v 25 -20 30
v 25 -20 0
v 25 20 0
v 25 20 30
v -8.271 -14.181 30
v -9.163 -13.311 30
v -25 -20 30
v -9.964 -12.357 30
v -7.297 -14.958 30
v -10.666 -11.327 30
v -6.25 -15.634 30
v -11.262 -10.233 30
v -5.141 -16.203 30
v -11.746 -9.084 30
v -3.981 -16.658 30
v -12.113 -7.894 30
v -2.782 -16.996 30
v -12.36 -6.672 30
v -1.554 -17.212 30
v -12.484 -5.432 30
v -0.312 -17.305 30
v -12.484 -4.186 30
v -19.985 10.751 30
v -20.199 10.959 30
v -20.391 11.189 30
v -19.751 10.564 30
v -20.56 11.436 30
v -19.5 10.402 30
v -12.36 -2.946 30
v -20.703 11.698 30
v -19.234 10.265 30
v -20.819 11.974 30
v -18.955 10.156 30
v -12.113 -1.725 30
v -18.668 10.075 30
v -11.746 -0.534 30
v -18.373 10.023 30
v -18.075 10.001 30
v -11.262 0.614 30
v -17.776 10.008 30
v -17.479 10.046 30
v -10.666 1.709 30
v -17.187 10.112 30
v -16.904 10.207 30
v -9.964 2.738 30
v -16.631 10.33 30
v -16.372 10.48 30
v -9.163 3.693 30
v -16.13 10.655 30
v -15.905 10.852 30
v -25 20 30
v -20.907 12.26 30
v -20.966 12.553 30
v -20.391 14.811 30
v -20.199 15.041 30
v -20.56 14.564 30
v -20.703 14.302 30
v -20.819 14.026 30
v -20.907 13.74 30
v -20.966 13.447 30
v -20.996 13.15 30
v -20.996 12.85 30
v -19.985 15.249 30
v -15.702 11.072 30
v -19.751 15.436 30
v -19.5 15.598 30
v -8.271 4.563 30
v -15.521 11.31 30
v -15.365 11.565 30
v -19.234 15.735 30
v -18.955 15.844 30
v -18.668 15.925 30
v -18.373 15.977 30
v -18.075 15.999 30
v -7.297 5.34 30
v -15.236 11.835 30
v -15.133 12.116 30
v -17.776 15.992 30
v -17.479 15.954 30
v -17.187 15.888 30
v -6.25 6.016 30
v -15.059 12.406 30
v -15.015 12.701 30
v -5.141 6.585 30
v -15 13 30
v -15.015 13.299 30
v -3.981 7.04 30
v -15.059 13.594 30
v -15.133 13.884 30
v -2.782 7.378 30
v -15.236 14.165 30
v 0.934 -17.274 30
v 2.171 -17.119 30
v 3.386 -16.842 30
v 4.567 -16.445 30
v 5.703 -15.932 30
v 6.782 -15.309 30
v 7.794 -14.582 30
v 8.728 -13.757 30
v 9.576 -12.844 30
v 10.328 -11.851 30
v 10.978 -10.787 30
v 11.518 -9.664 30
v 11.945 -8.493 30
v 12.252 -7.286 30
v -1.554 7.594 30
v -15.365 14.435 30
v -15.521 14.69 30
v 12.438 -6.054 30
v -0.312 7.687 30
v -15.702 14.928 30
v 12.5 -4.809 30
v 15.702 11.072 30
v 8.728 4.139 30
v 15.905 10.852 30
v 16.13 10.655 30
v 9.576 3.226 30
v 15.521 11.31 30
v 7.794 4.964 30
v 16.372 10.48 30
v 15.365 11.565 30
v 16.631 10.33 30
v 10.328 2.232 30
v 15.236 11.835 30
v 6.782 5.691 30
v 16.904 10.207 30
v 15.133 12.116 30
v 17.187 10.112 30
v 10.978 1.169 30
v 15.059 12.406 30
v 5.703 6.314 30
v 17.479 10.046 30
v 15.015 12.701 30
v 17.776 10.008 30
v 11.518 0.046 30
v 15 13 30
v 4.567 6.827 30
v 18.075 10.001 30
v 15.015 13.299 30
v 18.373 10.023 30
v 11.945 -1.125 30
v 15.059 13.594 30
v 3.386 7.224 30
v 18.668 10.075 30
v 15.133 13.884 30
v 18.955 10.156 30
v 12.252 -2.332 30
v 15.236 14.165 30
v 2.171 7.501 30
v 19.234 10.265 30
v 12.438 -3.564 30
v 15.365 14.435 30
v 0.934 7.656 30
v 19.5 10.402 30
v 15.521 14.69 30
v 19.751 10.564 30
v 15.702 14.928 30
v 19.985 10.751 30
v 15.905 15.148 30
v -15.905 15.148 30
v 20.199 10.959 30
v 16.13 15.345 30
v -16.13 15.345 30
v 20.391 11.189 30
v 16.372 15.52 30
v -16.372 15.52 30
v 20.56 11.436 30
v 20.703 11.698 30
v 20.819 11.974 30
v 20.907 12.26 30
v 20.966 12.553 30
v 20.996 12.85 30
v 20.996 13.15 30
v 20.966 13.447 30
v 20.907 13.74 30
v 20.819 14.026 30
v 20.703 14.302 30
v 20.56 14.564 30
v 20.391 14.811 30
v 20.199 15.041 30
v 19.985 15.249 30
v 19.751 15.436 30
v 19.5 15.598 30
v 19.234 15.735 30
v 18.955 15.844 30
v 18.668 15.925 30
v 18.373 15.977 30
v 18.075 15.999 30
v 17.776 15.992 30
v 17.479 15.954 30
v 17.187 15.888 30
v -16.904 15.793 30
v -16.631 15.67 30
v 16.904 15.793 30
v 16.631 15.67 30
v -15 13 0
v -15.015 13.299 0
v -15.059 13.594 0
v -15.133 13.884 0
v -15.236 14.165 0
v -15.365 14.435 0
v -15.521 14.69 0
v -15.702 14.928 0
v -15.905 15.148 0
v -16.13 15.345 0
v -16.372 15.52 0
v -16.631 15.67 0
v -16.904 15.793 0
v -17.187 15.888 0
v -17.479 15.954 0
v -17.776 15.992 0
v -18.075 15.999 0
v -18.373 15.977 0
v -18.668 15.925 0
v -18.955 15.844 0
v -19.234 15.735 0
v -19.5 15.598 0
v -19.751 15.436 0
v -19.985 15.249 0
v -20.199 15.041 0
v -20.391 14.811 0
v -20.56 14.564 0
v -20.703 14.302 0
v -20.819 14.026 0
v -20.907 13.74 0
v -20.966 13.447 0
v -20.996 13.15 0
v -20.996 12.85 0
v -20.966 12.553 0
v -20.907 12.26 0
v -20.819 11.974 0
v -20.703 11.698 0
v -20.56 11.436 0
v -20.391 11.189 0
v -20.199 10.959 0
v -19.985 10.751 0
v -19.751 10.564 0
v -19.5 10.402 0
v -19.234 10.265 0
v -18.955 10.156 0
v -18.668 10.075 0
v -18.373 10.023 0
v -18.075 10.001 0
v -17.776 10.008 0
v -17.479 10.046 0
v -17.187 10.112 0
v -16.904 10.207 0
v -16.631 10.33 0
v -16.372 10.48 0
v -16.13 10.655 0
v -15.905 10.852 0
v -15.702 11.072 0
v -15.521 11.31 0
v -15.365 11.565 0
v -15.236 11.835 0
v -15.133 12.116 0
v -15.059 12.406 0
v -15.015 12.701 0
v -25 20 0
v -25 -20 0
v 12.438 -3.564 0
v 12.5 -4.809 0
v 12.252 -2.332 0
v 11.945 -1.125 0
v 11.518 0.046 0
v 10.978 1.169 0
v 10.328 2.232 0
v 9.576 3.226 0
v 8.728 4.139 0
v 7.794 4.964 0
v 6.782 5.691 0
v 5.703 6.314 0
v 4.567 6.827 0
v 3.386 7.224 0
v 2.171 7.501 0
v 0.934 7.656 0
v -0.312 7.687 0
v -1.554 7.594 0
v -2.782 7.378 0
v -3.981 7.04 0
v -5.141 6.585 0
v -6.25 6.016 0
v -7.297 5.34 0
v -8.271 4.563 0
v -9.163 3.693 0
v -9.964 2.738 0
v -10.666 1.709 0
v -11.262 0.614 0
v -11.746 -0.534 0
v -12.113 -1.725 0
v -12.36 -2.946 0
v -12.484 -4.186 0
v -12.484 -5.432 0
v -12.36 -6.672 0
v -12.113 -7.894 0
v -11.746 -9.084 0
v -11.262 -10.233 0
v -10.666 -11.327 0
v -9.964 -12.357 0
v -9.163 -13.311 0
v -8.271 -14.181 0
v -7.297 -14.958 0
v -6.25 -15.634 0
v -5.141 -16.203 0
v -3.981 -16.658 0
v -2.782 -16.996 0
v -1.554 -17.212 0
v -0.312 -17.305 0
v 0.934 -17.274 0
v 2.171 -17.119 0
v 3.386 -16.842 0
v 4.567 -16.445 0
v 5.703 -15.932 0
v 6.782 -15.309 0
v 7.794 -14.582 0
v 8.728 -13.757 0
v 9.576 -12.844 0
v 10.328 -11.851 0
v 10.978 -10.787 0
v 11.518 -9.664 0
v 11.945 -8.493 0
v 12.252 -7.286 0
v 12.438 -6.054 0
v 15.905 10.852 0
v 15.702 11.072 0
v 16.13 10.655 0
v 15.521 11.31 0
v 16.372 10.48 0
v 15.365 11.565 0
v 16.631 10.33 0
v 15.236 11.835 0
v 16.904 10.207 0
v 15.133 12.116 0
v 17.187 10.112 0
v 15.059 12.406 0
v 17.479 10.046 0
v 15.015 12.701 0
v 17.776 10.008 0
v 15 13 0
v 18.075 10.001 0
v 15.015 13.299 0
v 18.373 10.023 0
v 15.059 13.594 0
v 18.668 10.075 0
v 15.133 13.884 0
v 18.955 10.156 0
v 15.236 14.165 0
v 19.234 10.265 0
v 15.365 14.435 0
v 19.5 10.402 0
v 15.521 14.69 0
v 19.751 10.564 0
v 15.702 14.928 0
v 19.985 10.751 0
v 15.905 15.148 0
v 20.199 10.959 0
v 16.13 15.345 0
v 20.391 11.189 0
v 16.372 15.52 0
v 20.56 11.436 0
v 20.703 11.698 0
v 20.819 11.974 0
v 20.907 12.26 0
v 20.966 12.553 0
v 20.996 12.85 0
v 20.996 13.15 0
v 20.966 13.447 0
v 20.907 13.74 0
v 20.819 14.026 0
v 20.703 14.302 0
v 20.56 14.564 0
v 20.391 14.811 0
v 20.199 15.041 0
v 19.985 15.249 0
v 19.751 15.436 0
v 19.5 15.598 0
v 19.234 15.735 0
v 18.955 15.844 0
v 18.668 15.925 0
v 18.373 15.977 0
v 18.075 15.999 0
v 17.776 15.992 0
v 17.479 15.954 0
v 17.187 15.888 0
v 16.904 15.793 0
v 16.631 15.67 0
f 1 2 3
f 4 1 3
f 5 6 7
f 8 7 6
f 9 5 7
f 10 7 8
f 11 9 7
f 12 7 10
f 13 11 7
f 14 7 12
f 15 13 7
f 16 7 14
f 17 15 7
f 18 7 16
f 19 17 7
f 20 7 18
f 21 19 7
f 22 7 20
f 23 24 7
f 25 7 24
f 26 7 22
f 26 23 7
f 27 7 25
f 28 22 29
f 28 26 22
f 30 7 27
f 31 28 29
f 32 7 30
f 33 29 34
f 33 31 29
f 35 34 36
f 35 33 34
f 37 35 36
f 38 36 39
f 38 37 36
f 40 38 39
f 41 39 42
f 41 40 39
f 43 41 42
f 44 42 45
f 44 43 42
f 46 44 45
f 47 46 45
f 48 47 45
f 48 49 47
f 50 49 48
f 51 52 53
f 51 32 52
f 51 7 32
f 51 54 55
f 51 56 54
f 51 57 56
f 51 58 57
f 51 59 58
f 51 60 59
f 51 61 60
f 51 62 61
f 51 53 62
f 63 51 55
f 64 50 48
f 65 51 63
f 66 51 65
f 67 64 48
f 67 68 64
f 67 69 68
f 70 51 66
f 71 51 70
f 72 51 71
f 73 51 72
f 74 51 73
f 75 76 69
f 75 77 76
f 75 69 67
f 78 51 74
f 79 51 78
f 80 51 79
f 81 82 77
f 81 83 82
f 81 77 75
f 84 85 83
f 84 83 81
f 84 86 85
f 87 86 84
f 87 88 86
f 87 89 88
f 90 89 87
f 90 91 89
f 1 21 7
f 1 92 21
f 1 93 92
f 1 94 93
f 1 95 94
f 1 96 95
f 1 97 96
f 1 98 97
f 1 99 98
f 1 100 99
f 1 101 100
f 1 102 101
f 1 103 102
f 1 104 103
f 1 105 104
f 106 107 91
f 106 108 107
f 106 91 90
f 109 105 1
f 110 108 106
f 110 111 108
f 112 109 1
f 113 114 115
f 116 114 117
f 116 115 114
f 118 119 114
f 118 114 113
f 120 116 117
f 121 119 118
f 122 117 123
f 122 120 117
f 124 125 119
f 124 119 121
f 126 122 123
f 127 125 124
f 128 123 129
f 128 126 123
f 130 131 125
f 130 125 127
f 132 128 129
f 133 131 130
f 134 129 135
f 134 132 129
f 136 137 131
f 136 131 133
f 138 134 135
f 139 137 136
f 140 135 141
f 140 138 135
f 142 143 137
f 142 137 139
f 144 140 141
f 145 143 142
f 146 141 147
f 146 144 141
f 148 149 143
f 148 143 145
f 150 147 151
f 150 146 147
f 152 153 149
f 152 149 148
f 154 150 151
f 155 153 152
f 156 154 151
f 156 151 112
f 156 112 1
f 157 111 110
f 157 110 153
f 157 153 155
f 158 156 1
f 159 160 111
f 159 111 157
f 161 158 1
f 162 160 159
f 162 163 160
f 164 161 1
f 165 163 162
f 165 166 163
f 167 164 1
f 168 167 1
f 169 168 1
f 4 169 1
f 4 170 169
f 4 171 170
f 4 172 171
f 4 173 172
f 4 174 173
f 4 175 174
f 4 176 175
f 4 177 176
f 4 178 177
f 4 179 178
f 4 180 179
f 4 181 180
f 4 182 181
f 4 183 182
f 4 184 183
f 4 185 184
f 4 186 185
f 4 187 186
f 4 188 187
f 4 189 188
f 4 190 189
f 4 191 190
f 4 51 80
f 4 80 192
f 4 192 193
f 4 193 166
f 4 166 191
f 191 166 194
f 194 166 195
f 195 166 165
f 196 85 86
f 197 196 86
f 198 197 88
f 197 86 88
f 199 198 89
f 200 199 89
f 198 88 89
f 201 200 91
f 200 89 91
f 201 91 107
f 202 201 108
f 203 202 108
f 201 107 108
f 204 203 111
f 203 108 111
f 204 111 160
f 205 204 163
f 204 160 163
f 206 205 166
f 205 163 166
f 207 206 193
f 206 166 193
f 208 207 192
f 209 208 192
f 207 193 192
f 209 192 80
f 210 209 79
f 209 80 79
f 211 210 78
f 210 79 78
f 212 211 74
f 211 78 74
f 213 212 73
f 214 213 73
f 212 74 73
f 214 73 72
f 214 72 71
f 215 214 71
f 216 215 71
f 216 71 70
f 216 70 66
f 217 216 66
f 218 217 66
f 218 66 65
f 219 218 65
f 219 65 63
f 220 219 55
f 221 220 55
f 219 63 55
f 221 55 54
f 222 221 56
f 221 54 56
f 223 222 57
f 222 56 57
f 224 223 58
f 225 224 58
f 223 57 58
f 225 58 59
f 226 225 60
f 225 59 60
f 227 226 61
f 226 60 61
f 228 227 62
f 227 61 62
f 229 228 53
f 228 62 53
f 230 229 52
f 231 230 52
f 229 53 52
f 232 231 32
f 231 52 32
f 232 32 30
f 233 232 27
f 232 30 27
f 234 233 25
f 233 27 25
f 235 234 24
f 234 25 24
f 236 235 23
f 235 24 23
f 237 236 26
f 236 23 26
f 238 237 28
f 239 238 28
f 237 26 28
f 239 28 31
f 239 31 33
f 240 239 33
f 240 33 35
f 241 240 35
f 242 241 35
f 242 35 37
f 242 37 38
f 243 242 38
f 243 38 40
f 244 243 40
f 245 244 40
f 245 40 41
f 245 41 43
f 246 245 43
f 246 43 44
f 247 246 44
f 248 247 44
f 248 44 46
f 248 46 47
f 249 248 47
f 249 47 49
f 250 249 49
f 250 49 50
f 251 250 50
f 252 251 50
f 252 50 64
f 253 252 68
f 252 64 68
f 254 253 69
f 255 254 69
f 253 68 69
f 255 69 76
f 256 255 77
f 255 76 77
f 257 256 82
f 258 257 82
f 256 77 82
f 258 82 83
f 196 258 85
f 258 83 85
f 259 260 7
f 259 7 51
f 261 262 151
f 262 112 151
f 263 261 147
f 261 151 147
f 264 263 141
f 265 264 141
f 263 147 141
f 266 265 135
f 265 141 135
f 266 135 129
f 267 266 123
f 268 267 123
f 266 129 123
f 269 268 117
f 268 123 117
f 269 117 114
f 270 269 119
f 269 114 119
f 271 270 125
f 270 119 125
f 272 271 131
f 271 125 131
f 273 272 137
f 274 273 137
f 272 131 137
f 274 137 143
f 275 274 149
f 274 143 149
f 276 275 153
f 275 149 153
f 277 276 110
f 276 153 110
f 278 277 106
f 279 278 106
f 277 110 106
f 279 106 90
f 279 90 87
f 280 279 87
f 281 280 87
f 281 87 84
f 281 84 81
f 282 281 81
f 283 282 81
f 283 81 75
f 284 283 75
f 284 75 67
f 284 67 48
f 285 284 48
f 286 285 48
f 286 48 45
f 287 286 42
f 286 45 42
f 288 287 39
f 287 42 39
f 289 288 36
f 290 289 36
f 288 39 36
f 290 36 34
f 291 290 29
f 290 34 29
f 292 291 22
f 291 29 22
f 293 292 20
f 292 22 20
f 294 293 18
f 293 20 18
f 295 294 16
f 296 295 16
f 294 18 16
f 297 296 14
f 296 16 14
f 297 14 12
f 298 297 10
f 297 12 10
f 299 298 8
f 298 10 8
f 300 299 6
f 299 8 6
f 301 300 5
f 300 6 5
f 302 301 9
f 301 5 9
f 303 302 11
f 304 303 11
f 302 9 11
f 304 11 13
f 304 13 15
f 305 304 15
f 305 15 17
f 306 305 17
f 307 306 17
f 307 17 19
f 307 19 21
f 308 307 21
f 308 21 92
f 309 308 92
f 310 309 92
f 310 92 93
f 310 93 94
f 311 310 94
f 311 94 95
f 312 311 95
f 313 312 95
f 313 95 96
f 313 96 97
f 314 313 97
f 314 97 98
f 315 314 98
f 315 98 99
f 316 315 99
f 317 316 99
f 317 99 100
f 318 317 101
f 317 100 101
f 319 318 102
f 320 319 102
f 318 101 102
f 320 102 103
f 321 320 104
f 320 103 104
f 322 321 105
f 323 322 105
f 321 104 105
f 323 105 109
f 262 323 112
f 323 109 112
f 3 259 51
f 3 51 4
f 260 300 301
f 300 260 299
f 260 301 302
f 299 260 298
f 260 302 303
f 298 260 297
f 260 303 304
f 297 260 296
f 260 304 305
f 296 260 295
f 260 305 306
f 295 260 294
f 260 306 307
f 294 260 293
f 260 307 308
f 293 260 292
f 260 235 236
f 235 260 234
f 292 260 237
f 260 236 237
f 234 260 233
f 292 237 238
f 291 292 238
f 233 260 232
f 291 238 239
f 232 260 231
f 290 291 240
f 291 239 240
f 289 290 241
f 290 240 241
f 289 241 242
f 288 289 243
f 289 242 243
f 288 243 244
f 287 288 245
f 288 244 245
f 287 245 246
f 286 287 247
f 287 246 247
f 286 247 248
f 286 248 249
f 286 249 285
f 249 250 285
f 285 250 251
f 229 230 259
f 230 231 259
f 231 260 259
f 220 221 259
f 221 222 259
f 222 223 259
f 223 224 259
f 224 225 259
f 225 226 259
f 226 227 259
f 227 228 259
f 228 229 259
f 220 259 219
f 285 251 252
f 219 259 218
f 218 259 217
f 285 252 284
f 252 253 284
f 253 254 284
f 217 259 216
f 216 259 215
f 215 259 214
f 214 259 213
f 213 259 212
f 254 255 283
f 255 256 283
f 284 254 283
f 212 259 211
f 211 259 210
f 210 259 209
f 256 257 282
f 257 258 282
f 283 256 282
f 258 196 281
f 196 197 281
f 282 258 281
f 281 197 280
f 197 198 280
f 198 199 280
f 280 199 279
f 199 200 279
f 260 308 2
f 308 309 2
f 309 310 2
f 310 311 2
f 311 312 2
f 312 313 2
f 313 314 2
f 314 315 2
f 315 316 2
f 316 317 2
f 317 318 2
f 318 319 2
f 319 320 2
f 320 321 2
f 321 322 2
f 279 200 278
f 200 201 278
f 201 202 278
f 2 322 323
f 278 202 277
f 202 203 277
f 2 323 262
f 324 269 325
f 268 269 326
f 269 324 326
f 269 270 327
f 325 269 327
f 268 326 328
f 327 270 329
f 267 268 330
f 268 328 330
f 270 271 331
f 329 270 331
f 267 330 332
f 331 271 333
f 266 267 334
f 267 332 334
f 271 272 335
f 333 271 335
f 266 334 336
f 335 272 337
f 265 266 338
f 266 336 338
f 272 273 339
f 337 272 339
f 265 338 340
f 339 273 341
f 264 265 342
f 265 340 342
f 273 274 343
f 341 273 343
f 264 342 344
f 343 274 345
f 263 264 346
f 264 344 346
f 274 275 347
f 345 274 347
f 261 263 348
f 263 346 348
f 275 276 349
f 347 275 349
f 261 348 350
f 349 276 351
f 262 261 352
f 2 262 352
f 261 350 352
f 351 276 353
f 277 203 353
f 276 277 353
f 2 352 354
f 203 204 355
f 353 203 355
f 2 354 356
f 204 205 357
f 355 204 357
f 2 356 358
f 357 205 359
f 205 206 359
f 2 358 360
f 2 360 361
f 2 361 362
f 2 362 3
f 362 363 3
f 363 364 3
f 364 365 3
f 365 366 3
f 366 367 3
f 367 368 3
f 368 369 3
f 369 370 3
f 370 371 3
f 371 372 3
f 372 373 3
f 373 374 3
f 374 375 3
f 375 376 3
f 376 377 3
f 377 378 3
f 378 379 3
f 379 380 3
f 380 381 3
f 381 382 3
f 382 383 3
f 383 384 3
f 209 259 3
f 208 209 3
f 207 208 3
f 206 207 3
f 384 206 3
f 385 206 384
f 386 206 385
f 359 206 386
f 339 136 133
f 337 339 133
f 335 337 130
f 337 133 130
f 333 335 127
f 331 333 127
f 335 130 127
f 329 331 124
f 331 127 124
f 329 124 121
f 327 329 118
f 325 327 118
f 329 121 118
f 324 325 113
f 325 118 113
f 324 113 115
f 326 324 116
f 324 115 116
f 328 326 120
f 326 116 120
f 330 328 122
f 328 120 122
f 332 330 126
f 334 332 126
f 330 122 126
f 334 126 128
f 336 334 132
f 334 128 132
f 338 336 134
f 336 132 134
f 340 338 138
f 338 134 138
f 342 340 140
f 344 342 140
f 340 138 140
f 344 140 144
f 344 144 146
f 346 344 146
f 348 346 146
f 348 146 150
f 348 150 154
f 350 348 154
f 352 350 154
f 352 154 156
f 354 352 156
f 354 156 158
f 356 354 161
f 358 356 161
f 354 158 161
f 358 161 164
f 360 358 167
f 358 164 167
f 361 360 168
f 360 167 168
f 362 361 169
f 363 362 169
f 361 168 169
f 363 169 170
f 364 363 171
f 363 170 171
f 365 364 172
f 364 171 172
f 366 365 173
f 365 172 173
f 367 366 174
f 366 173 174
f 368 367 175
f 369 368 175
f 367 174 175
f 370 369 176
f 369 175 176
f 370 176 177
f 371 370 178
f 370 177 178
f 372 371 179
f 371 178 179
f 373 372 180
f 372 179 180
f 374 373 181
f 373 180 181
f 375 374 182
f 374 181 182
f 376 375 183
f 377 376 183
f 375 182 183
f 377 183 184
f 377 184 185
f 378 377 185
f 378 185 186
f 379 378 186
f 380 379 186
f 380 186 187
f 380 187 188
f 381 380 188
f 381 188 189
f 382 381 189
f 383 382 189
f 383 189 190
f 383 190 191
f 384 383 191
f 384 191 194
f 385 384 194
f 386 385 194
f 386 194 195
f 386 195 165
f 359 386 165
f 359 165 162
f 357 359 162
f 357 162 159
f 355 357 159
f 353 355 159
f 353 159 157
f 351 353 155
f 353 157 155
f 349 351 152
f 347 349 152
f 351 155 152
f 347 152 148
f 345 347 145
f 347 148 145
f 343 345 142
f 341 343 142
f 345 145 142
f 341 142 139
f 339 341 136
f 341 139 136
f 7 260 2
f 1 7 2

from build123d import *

# Parameters (mm, degrees)
CROQUIS1_W              = 50
CROQUIS1_H              = 40
CROQUIS1_R              = 12.5
SALIENTE_EXTRUIR1_DEPTH = 30
CROQUIS2_R              = 3
CORTAR_EXTRUIR1_DEPTH   = 30
SALIENTE_EXTRUIR2_START = -30
CROQUIS3_R              = 12.5
SALIENTE_EXTRUIR2_DEPTH = 30
CROQUIS4_R              = 12.5
CORTAR_EXTRUIR2_DEPTH   = 20.1
CROQUIS5_R              = 12.5
CORTAR_EXTRUIR3_DEPTH   = 9.9


with BuildPart() as part:
    # Croquis1 → Saliente-Extruir1 (new body)
    with BuildSketch(Plane.XY):
        Rectangle(CROQUIS1_W, CROQUIS1_H)
        Circle(CROQUIS1_R, mode=Mode.SUBTRACT)
    extrude(amount=SALIENTE_EXTRUIR1_DEPTH)

    # Croquis2 → Cortar-Extruir1 (cut)
    with BuildSketch(Plane.XY.offset(30)):
        with Locations((-18, 13)):
            Circle(CROQUIS2_R)
        with Locations(Location((18, 13, 0), (0, 0, 180))):
            Circle(CROQUIS2_R)
    extrude(amount=-CORTAR_EXTRUIR1_DEPTH, mode=Mode.SUBTRACT)

    # Croquis3 → Saliente-Extruir2 (add)
    with BuildSketch(Plane.XY.offset(30).offset(SALIENTE_EXTRUIR2_START)):
        Circle(CROQUIS3_R)
    extrude(amount=SALIENTE_EXTRUIR2_DEPTH)

    # Croquis4 → Cortar-Extruir2 (cut)
    with BuildSketch(Plane.XY.offset(30)):
        with Locations((0, -4.809057324)):
            Circle(CROQUIS4_R)
    extrude(amount=-CORTAR_EXTRUIR2_DEPTH, mode=Mode.SUBTRACT)

    # Croquis5 → Cortar-Extruir3 (cut)
    with BuildSketch(Plane.XY.offset(9.9)):
        with Locations((0, -4.809057324)):
            Circle(CROQUIS5_R)
    extrude(amount=-CORTAR_EXTRUIR3_DEPTH, mode=Mode.SUBTRACT)


solid = part.part
